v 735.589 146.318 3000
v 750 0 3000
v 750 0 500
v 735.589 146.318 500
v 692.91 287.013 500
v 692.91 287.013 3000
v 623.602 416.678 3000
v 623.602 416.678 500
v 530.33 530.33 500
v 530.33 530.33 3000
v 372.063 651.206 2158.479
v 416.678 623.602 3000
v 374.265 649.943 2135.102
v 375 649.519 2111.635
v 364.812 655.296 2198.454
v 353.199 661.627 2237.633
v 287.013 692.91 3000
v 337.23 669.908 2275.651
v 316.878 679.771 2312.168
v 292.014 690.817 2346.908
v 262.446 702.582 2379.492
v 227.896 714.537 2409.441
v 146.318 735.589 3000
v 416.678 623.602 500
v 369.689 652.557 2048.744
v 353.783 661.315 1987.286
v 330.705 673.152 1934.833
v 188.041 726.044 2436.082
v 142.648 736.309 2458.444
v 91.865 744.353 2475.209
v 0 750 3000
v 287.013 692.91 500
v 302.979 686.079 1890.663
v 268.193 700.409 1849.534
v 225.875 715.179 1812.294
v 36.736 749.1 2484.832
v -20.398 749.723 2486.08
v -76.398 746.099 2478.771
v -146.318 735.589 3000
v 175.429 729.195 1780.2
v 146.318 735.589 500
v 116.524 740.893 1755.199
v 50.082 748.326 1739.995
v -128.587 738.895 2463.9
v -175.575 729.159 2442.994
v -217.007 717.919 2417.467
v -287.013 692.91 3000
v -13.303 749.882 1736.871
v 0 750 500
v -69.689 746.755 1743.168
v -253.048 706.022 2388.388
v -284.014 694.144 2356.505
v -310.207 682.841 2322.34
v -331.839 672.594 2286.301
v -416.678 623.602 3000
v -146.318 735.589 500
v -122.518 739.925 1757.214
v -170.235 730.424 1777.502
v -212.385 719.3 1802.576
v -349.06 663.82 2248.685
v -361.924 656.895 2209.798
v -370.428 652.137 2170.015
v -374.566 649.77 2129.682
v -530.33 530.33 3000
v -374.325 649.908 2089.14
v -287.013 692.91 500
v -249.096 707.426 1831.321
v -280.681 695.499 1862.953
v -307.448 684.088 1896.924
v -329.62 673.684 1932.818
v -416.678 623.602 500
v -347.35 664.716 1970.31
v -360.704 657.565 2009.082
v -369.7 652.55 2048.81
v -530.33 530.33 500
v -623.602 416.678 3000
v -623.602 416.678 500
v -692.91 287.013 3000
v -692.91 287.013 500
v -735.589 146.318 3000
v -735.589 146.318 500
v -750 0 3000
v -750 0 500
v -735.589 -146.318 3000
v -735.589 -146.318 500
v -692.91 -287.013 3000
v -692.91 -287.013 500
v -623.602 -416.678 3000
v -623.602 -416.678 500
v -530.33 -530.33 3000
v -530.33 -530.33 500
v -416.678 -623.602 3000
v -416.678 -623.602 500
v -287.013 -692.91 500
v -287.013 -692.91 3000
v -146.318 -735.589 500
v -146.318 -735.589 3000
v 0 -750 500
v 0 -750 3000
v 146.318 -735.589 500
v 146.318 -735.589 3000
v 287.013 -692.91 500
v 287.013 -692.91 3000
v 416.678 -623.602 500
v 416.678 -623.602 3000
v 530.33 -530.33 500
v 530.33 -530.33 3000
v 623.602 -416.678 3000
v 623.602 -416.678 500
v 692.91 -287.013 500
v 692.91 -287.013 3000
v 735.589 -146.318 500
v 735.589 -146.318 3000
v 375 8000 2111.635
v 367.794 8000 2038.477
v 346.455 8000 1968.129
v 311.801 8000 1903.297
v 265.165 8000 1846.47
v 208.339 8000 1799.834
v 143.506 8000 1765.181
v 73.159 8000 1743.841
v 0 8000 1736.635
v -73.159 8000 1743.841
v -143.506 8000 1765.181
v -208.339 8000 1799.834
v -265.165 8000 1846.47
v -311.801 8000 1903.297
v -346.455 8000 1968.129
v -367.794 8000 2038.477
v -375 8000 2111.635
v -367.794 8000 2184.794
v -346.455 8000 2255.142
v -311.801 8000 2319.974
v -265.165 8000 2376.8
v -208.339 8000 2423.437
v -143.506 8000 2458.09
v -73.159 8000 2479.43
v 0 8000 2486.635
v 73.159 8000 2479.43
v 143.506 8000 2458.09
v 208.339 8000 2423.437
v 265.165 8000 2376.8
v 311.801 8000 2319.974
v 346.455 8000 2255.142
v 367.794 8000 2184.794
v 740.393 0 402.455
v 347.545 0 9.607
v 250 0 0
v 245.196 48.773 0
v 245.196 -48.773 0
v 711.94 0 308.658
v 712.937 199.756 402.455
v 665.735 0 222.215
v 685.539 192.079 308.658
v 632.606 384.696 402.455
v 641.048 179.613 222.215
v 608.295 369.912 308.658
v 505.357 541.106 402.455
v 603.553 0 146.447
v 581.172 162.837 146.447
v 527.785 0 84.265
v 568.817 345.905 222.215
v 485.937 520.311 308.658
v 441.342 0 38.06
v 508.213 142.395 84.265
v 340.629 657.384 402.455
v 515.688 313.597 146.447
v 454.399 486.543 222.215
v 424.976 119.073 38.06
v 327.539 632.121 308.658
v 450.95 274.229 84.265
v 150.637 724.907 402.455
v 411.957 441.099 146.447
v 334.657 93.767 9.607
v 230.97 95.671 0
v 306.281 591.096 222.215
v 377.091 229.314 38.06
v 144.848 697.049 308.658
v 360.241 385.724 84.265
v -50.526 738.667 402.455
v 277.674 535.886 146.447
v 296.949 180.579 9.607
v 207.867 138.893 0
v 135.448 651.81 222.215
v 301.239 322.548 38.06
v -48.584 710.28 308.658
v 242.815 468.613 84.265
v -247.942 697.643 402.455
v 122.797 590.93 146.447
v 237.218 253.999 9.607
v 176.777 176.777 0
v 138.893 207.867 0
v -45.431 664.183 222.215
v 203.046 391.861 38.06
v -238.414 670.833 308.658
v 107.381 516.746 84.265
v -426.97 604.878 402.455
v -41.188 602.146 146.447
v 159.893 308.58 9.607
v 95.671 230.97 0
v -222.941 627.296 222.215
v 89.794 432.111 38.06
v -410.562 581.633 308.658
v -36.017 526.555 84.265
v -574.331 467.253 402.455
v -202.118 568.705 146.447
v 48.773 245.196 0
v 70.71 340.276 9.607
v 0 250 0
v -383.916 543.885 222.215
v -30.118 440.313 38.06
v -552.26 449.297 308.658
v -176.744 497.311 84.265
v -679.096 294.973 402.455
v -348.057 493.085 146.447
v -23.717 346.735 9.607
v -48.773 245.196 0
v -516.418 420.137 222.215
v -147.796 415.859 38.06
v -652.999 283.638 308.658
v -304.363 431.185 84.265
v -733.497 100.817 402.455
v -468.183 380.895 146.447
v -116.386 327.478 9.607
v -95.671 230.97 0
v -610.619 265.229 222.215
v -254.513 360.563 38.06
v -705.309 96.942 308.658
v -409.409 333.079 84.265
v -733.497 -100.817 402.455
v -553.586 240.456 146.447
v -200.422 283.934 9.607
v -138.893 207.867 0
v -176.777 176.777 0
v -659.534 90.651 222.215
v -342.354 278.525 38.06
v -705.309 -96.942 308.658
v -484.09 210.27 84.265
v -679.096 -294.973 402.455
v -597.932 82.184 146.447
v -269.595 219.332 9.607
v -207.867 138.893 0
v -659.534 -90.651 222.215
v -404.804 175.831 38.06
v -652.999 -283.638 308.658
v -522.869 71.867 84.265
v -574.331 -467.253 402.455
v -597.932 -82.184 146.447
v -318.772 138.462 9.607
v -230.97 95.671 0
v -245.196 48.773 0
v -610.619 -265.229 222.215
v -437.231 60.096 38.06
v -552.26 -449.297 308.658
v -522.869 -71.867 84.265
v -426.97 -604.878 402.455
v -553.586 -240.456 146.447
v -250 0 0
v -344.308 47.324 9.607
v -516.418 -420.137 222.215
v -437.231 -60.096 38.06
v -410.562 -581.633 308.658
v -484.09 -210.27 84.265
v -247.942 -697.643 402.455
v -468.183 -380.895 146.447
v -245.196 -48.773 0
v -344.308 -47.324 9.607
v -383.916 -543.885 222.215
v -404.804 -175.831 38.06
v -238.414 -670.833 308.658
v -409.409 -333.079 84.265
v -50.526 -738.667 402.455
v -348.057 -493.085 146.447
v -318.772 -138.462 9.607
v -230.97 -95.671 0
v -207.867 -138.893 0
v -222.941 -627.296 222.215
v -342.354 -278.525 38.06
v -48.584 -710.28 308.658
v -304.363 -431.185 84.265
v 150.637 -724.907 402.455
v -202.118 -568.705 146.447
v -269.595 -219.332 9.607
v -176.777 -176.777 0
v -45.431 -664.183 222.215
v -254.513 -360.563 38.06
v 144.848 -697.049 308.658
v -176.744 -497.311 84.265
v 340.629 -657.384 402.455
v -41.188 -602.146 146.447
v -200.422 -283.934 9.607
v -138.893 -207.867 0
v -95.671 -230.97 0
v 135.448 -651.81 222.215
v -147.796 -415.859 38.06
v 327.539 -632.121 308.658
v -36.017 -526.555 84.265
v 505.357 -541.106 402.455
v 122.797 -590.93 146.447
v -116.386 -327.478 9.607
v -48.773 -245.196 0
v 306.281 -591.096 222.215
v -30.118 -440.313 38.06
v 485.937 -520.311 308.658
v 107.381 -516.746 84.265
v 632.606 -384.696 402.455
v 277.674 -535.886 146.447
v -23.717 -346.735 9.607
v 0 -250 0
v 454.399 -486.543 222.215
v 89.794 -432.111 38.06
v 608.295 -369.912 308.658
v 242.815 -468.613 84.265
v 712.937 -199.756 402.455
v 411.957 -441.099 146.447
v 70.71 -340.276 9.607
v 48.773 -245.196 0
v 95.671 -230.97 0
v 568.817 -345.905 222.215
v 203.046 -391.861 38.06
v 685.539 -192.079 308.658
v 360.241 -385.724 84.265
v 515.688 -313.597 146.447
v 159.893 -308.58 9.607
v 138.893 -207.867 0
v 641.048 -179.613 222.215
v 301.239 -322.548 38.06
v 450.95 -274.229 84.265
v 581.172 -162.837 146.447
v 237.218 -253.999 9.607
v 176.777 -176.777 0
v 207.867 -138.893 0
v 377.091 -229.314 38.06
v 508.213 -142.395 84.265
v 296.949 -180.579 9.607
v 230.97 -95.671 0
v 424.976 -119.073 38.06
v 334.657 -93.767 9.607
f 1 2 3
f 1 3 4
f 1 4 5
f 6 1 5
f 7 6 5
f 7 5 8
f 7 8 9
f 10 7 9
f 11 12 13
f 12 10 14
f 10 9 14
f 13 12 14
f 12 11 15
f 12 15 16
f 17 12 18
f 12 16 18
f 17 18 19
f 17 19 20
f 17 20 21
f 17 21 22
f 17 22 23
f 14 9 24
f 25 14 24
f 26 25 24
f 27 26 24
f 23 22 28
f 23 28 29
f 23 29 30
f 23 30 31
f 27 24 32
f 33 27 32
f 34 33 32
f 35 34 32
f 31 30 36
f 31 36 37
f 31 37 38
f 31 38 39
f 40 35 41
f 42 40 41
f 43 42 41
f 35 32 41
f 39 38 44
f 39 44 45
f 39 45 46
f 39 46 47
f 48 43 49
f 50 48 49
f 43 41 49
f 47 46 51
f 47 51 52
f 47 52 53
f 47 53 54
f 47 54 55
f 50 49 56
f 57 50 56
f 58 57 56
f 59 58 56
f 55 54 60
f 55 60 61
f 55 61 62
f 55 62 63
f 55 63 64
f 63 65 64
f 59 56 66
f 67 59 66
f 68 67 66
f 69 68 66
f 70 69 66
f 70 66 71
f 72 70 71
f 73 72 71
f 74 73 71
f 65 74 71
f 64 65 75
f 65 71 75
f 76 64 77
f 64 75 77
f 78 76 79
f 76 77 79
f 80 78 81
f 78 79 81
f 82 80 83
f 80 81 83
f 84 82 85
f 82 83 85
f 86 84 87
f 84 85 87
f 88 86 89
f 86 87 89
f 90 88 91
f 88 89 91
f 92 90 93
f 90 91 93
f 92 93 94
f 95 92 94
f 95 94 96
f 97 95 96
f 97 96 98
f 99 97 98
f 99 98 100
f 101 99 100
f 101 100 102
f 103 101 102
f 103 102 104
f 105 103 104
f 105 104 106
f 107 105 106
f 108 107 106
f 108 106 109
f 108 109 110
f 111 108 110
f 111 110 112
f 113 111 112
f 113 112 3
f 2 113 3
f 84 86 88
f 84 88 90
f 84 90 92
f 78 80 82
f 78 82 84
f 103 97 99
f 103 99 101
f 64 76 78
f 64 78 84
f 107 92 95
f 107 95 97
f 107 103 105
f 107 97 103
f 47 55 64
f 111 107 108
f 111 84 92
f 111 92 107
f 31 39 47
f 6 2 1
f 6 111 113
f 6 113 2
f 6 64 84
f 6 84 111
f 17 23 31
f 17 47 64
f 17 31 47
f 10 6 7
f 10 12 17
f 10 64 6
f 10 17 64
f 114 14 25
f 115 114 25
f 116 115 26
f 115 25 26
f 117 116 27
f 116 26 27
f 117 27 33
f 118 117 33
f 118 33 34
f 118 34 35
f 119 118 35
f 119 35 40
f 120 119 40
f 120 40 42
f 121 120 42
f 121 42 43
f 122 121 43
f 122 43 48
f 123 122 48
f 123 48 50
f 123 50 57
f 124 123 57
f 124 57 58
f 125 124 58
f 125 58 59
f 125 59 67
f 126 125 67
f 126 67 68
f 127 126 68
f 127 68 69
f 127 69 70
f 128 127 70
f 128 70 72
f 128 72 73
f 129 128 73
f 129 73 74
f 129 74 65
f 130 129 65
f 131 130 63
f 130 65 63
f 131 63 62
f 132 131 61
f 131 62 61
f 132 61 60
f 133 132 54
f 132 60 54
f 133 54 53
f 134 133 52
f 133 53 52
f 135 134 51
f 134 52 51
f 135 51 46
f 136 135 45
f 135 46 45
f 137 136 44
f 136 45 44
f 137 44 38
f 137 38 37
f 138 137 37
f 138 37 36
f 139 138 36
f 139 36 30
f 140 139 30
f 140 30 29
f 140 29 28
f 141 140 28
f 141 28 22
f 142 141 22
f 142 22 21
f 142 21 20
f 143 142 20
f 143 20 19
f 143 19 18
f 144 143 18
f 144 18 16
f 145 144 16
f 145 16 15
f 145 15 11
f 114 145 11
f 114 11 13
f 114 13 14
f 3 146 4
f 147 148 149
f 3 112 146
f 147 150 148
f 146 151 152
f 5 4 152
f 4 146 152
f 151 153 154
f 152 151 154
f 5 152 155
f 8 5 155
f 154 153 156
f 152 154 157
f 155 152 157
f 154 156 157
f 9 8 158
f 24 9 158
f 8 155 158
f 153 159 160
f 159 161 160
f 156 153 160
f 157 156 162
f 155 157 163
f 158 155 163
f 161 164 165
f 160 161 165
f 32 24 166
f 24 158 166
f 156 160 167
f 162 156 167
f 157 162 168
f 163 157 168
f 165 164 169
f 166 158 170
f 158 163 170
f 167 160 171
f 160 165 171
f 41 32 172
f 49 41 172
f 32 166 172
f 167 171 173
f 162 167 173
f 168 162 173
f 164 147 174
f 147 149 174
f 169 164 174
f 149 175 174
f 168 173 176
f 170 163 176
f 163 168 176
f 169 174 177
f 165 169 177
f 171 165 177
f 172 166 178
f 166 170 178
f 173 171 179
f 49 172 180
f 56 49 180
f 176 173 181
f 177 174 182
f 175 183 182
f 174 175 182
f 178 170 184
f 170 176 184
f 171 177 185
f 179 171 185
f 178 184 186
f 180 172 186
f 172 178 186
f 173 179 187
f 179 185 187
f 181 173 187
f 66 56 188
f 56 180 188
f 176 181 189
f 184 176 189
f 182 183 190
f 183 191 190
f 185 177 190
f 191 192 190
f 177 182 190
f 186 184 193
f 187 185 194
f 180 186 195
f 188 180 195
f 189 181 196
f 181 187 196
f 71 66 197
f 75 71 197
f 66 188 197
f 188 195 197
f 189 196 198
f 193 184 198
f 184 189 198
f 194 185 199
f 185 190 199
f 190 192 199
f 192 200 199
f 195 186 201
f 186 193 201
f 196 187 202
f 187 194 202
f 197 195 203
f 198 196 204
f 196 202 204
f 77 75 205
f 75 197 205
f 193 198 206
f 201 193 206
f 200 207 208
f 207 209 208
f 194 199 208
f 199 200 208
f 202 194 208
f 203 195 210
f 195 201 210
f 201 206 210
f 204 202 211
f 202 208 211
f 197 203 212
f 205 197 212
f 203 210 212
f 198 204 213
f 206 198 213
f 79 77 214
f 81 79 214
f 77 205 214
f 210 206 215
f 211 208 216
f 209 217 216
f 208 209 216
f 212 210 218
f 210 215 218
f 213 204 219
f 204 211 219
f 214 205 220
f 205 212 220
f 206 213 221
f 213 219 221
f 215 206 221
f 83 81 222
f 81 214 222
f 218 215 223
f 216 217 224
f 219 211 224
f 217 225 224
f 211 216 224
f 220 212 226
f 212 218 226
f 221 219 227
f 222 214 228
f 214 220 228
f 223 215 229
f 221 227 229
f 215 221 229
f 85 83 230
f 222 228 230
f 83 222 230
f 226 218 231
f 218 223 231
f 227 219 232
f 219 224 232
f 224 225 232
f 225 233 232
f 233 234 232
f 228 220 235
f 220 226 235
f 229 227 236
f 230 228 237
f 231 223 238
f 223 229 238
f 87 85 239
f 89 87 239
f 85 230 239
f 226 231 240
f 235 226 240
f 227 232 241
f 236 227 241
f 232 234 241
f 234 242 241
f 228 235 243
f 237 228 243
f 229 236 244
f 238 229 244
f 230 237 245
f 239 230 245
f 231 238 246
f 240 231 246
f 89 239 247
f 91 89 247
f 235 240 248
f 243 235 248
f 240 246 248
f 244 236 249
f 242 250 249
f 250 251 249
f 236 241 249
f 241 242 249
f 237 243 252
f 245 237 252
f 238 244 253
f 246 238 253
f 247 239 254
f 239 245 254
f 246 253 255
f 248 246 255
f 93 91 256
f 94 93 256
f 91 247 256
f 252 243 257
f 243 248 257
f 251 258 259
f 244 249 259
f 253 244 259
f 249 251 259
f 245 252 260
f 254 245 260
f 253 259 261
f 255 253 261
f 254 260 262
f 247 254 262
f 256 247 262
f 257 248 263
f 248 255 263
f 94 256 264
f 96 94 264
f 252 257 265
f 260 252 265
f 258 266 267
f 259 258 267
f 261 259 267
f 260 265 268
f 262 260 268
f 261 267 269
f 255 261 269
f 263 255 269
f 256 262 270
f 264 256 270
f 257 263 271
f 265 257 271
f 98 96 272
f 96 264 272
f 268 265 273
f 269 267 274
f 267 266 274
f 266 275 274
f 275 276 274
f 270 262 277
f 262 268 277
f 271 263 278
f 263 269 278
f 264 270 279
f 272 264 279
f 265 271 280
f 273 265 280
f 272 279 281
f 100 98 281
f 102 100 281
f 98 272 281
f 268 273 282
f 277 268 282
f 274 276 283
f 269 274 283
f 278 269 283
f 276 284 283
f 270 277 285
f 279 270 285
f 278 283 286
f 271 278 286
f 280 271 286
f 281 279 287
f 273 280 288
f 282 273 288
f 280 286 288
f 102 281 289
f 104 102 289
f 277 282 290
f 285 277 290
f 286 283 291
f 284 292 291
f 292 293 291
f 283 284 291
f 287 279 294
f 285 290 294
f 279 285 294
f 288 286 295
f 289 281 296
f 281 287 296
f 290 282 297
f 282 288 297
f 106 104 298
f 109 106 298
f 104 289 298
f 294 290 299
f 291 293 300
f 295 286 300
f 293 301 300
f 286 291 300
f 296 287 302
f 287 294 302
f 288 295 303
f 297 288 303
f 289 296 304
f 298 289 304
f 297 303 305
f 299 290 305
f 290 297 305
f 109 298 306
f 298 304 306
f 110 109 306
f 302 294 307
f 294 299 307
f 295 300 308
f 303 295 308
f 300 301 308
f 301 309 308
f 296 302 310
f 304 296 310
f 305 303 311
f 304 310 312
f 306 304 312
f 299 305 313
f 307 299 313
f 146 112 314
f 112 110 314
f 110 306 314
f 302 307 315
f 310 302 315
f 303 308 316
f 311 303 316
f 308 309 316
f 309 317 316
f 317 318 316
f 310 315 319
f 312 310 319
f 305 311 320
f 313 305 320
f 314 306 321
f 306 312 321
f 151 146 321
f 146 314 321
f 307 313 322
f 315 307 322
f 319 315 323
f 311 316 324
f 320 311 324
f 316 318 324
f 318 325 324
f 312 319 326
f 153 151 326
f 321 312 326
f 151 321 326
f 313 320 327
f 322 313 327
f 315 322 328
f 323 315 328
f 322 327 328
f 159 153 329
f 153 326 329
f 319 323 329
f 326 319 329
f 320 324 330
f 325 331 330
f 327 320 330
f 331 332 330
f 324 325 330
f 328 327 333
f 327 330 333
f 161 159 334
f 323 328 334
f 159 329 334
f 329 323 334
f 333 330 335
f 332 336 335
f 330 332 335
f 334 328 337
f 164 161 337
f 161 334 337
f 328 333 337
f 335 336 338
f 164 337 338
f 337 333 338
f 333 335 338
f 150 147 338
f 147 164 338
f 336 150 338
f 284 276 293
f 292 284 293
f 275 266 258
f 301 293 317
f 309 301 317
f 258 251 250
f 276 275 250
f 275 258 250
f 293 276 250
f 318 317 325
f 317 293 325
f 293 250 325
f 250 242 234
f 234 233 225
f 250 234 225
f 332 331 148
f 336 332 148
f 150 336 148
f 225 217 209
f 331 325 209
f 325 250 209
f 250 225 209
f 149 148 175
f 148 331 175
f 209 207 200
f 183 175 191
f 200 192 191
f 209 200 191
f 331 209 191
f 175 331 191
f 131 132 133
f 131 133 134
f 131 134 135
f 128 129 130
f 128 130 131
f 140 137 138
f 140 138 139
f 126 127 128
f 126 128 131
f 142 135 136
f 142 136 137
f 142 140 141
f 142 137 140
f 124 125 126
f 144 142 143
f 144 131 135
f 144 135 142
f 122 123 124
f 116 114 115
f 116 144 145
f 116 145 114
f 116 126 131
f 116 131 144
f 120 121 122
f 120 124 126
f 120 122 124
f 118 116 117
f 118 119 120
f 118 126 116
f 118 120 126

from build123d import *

# Parameters (mm, degrees)
SKETCH1_R           = 750
BOSS_EXTRUDE1_DEPTH = 3000
FILLET1_R           = 500
SKETCH2_R           = 375
BOSS_EXTRUDE2_DEPTH = 8000


with BuildPart() as part:
    # Sketch1 → Boss-Extrude1 (new body)
    with BuildSketch(Plane.XY):
        Circle(SKETCH1_R)
    extrude(amount=BOSS_EXTRUDE1_DEPTH)

    # Fillet1
    fillet1_edges = [part.edges().sort_by_distance(p)[0] for p in [
        (-750, 0, 0),
    ]]
    fillet(fillet1_edges, radius=FILLET1_R)

    # Sketch2 → Boss-Extrude2 (add)
    with BuildSketch(Plane(origin=(0, 0, 0), x_dir=(1, 0, 0), z_dir=(0, 1, 0))):
        with Locations((0, -2111.63545154)):
            Circle(SKETCH2_R)
    extrude(amount=BOSS_EXTRUDE2_DEPTH)


solid = part.part
